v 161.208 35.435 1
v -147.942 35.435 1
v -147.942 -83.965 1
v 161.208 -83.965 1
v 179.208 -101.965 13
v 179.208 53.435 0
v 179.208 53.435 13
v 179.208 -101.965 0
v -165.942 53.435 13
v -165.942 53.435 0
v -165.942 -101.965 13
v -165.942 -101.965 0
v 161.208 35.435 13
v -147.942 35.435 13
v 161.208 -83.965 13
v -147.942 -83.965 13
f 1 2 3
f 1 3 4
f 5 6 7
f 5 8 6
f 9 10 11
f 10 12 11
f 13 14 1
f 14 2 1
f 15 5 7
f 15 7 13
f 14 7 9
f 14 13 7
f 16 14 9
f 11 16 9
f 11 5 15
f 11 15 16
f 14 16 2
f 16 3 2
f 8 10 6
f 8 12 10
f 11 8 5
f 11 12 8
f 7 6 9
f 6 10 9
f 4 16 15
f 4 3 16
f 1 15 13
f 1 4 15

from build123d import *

# Parameters (mm, degrees)
F0_W     = 311.15
F0_H     = 121.4
F0_R     = 2.5
F0_R_2   = 2
F1_DEPTH = 13
F2_T     = -1
F4_DEPTH = 17
F5_DEPTH = 17
F6_DEPTH = 17
F7_DEPTH = 17


# Not quite as in the source:
# - the program builds the solid bodies; features that only make, move or delete a surface that nothing else refers to are left out


with BuildPart() as f1:
    # F0 (on Top) → F1 (new body)
    with BuildSketch(Plane.XY):
        with Locations((6.6334828734, -24.2652736852)):
            Rectangle(F0_W, F0_H)
        with Locations((-116.9415171266, -32.9652736852)):
            Circle(F0_R, mode=Mode.SUBTRACT)
        with Locations((-61.4415171266, -23.5952736852)):
            Circle(F0_R_2, mode=Mode.SUBTRACT)
        with Locations((74.7084828734, -23.5652736852)):
            Circle(F0_R_2, mode=Mode.SUBTRACT)
        with Locations((114.5584828734, -13.7852736852)):
            Circle(F0_R, mode=Mode.SUBTRACT)
        with Locations((-116.9415171266, -32.9652736852)):
            Circle(F0_R)
        with Locations((114.5584828734, -13.7852736852)):
            Circle(F0_R)
        with Locations((-61.4415171266, -23.5952736852)):
            Circle(F0_R_2)
        with Locations((74.7084828734, -23.5652736852)):
            Circle(F0_R_2)
    extrude(amount=F1_DEPTH)

    # F2
    f2_openings = [f1.faces().sort_by_distance(p)[0] for p in [
        (6.633483, -24.265274, 13),
    ]]
    offset(amount=F2_T, openings=f2_openings)

    # F4 (add): a face of the model
    f4_faces = [f1.faces().sort_by_distance(p)[0] for p in [
        (6.6334828734, -84.9652736852, 6.5),
    ]]
    extrude(f4_faces, amount=F4_DEPTH)

    # F5 (add): a face of the model
    f5_faces = [f1.faces().sort_by_distance(p)[0] for p in [
        (-148.9415171266, -32.7652736852, 6.5),
    ]]
    extrude(f5_faces, amount=F5_DEPTH)

    # F6 (add): a face of the model
    f6_faces = [f1.faces().sort_by_distance(p)[0] for p in [
        (162.2084828734, -32.7652736852, 6.5),
    ]]
    extrude(f6_faces, amount=F6_DEPTH)

    # F7 (add): a face of the model
    f7_faces = [f1.faces().sort_by_distance(p)[0] for p in [
        (6.6334828734, 36.4347263148, 6.5),
    ]]
    extrude(f7_faces, amount=F7_DEPTH)


solid = f1.part
